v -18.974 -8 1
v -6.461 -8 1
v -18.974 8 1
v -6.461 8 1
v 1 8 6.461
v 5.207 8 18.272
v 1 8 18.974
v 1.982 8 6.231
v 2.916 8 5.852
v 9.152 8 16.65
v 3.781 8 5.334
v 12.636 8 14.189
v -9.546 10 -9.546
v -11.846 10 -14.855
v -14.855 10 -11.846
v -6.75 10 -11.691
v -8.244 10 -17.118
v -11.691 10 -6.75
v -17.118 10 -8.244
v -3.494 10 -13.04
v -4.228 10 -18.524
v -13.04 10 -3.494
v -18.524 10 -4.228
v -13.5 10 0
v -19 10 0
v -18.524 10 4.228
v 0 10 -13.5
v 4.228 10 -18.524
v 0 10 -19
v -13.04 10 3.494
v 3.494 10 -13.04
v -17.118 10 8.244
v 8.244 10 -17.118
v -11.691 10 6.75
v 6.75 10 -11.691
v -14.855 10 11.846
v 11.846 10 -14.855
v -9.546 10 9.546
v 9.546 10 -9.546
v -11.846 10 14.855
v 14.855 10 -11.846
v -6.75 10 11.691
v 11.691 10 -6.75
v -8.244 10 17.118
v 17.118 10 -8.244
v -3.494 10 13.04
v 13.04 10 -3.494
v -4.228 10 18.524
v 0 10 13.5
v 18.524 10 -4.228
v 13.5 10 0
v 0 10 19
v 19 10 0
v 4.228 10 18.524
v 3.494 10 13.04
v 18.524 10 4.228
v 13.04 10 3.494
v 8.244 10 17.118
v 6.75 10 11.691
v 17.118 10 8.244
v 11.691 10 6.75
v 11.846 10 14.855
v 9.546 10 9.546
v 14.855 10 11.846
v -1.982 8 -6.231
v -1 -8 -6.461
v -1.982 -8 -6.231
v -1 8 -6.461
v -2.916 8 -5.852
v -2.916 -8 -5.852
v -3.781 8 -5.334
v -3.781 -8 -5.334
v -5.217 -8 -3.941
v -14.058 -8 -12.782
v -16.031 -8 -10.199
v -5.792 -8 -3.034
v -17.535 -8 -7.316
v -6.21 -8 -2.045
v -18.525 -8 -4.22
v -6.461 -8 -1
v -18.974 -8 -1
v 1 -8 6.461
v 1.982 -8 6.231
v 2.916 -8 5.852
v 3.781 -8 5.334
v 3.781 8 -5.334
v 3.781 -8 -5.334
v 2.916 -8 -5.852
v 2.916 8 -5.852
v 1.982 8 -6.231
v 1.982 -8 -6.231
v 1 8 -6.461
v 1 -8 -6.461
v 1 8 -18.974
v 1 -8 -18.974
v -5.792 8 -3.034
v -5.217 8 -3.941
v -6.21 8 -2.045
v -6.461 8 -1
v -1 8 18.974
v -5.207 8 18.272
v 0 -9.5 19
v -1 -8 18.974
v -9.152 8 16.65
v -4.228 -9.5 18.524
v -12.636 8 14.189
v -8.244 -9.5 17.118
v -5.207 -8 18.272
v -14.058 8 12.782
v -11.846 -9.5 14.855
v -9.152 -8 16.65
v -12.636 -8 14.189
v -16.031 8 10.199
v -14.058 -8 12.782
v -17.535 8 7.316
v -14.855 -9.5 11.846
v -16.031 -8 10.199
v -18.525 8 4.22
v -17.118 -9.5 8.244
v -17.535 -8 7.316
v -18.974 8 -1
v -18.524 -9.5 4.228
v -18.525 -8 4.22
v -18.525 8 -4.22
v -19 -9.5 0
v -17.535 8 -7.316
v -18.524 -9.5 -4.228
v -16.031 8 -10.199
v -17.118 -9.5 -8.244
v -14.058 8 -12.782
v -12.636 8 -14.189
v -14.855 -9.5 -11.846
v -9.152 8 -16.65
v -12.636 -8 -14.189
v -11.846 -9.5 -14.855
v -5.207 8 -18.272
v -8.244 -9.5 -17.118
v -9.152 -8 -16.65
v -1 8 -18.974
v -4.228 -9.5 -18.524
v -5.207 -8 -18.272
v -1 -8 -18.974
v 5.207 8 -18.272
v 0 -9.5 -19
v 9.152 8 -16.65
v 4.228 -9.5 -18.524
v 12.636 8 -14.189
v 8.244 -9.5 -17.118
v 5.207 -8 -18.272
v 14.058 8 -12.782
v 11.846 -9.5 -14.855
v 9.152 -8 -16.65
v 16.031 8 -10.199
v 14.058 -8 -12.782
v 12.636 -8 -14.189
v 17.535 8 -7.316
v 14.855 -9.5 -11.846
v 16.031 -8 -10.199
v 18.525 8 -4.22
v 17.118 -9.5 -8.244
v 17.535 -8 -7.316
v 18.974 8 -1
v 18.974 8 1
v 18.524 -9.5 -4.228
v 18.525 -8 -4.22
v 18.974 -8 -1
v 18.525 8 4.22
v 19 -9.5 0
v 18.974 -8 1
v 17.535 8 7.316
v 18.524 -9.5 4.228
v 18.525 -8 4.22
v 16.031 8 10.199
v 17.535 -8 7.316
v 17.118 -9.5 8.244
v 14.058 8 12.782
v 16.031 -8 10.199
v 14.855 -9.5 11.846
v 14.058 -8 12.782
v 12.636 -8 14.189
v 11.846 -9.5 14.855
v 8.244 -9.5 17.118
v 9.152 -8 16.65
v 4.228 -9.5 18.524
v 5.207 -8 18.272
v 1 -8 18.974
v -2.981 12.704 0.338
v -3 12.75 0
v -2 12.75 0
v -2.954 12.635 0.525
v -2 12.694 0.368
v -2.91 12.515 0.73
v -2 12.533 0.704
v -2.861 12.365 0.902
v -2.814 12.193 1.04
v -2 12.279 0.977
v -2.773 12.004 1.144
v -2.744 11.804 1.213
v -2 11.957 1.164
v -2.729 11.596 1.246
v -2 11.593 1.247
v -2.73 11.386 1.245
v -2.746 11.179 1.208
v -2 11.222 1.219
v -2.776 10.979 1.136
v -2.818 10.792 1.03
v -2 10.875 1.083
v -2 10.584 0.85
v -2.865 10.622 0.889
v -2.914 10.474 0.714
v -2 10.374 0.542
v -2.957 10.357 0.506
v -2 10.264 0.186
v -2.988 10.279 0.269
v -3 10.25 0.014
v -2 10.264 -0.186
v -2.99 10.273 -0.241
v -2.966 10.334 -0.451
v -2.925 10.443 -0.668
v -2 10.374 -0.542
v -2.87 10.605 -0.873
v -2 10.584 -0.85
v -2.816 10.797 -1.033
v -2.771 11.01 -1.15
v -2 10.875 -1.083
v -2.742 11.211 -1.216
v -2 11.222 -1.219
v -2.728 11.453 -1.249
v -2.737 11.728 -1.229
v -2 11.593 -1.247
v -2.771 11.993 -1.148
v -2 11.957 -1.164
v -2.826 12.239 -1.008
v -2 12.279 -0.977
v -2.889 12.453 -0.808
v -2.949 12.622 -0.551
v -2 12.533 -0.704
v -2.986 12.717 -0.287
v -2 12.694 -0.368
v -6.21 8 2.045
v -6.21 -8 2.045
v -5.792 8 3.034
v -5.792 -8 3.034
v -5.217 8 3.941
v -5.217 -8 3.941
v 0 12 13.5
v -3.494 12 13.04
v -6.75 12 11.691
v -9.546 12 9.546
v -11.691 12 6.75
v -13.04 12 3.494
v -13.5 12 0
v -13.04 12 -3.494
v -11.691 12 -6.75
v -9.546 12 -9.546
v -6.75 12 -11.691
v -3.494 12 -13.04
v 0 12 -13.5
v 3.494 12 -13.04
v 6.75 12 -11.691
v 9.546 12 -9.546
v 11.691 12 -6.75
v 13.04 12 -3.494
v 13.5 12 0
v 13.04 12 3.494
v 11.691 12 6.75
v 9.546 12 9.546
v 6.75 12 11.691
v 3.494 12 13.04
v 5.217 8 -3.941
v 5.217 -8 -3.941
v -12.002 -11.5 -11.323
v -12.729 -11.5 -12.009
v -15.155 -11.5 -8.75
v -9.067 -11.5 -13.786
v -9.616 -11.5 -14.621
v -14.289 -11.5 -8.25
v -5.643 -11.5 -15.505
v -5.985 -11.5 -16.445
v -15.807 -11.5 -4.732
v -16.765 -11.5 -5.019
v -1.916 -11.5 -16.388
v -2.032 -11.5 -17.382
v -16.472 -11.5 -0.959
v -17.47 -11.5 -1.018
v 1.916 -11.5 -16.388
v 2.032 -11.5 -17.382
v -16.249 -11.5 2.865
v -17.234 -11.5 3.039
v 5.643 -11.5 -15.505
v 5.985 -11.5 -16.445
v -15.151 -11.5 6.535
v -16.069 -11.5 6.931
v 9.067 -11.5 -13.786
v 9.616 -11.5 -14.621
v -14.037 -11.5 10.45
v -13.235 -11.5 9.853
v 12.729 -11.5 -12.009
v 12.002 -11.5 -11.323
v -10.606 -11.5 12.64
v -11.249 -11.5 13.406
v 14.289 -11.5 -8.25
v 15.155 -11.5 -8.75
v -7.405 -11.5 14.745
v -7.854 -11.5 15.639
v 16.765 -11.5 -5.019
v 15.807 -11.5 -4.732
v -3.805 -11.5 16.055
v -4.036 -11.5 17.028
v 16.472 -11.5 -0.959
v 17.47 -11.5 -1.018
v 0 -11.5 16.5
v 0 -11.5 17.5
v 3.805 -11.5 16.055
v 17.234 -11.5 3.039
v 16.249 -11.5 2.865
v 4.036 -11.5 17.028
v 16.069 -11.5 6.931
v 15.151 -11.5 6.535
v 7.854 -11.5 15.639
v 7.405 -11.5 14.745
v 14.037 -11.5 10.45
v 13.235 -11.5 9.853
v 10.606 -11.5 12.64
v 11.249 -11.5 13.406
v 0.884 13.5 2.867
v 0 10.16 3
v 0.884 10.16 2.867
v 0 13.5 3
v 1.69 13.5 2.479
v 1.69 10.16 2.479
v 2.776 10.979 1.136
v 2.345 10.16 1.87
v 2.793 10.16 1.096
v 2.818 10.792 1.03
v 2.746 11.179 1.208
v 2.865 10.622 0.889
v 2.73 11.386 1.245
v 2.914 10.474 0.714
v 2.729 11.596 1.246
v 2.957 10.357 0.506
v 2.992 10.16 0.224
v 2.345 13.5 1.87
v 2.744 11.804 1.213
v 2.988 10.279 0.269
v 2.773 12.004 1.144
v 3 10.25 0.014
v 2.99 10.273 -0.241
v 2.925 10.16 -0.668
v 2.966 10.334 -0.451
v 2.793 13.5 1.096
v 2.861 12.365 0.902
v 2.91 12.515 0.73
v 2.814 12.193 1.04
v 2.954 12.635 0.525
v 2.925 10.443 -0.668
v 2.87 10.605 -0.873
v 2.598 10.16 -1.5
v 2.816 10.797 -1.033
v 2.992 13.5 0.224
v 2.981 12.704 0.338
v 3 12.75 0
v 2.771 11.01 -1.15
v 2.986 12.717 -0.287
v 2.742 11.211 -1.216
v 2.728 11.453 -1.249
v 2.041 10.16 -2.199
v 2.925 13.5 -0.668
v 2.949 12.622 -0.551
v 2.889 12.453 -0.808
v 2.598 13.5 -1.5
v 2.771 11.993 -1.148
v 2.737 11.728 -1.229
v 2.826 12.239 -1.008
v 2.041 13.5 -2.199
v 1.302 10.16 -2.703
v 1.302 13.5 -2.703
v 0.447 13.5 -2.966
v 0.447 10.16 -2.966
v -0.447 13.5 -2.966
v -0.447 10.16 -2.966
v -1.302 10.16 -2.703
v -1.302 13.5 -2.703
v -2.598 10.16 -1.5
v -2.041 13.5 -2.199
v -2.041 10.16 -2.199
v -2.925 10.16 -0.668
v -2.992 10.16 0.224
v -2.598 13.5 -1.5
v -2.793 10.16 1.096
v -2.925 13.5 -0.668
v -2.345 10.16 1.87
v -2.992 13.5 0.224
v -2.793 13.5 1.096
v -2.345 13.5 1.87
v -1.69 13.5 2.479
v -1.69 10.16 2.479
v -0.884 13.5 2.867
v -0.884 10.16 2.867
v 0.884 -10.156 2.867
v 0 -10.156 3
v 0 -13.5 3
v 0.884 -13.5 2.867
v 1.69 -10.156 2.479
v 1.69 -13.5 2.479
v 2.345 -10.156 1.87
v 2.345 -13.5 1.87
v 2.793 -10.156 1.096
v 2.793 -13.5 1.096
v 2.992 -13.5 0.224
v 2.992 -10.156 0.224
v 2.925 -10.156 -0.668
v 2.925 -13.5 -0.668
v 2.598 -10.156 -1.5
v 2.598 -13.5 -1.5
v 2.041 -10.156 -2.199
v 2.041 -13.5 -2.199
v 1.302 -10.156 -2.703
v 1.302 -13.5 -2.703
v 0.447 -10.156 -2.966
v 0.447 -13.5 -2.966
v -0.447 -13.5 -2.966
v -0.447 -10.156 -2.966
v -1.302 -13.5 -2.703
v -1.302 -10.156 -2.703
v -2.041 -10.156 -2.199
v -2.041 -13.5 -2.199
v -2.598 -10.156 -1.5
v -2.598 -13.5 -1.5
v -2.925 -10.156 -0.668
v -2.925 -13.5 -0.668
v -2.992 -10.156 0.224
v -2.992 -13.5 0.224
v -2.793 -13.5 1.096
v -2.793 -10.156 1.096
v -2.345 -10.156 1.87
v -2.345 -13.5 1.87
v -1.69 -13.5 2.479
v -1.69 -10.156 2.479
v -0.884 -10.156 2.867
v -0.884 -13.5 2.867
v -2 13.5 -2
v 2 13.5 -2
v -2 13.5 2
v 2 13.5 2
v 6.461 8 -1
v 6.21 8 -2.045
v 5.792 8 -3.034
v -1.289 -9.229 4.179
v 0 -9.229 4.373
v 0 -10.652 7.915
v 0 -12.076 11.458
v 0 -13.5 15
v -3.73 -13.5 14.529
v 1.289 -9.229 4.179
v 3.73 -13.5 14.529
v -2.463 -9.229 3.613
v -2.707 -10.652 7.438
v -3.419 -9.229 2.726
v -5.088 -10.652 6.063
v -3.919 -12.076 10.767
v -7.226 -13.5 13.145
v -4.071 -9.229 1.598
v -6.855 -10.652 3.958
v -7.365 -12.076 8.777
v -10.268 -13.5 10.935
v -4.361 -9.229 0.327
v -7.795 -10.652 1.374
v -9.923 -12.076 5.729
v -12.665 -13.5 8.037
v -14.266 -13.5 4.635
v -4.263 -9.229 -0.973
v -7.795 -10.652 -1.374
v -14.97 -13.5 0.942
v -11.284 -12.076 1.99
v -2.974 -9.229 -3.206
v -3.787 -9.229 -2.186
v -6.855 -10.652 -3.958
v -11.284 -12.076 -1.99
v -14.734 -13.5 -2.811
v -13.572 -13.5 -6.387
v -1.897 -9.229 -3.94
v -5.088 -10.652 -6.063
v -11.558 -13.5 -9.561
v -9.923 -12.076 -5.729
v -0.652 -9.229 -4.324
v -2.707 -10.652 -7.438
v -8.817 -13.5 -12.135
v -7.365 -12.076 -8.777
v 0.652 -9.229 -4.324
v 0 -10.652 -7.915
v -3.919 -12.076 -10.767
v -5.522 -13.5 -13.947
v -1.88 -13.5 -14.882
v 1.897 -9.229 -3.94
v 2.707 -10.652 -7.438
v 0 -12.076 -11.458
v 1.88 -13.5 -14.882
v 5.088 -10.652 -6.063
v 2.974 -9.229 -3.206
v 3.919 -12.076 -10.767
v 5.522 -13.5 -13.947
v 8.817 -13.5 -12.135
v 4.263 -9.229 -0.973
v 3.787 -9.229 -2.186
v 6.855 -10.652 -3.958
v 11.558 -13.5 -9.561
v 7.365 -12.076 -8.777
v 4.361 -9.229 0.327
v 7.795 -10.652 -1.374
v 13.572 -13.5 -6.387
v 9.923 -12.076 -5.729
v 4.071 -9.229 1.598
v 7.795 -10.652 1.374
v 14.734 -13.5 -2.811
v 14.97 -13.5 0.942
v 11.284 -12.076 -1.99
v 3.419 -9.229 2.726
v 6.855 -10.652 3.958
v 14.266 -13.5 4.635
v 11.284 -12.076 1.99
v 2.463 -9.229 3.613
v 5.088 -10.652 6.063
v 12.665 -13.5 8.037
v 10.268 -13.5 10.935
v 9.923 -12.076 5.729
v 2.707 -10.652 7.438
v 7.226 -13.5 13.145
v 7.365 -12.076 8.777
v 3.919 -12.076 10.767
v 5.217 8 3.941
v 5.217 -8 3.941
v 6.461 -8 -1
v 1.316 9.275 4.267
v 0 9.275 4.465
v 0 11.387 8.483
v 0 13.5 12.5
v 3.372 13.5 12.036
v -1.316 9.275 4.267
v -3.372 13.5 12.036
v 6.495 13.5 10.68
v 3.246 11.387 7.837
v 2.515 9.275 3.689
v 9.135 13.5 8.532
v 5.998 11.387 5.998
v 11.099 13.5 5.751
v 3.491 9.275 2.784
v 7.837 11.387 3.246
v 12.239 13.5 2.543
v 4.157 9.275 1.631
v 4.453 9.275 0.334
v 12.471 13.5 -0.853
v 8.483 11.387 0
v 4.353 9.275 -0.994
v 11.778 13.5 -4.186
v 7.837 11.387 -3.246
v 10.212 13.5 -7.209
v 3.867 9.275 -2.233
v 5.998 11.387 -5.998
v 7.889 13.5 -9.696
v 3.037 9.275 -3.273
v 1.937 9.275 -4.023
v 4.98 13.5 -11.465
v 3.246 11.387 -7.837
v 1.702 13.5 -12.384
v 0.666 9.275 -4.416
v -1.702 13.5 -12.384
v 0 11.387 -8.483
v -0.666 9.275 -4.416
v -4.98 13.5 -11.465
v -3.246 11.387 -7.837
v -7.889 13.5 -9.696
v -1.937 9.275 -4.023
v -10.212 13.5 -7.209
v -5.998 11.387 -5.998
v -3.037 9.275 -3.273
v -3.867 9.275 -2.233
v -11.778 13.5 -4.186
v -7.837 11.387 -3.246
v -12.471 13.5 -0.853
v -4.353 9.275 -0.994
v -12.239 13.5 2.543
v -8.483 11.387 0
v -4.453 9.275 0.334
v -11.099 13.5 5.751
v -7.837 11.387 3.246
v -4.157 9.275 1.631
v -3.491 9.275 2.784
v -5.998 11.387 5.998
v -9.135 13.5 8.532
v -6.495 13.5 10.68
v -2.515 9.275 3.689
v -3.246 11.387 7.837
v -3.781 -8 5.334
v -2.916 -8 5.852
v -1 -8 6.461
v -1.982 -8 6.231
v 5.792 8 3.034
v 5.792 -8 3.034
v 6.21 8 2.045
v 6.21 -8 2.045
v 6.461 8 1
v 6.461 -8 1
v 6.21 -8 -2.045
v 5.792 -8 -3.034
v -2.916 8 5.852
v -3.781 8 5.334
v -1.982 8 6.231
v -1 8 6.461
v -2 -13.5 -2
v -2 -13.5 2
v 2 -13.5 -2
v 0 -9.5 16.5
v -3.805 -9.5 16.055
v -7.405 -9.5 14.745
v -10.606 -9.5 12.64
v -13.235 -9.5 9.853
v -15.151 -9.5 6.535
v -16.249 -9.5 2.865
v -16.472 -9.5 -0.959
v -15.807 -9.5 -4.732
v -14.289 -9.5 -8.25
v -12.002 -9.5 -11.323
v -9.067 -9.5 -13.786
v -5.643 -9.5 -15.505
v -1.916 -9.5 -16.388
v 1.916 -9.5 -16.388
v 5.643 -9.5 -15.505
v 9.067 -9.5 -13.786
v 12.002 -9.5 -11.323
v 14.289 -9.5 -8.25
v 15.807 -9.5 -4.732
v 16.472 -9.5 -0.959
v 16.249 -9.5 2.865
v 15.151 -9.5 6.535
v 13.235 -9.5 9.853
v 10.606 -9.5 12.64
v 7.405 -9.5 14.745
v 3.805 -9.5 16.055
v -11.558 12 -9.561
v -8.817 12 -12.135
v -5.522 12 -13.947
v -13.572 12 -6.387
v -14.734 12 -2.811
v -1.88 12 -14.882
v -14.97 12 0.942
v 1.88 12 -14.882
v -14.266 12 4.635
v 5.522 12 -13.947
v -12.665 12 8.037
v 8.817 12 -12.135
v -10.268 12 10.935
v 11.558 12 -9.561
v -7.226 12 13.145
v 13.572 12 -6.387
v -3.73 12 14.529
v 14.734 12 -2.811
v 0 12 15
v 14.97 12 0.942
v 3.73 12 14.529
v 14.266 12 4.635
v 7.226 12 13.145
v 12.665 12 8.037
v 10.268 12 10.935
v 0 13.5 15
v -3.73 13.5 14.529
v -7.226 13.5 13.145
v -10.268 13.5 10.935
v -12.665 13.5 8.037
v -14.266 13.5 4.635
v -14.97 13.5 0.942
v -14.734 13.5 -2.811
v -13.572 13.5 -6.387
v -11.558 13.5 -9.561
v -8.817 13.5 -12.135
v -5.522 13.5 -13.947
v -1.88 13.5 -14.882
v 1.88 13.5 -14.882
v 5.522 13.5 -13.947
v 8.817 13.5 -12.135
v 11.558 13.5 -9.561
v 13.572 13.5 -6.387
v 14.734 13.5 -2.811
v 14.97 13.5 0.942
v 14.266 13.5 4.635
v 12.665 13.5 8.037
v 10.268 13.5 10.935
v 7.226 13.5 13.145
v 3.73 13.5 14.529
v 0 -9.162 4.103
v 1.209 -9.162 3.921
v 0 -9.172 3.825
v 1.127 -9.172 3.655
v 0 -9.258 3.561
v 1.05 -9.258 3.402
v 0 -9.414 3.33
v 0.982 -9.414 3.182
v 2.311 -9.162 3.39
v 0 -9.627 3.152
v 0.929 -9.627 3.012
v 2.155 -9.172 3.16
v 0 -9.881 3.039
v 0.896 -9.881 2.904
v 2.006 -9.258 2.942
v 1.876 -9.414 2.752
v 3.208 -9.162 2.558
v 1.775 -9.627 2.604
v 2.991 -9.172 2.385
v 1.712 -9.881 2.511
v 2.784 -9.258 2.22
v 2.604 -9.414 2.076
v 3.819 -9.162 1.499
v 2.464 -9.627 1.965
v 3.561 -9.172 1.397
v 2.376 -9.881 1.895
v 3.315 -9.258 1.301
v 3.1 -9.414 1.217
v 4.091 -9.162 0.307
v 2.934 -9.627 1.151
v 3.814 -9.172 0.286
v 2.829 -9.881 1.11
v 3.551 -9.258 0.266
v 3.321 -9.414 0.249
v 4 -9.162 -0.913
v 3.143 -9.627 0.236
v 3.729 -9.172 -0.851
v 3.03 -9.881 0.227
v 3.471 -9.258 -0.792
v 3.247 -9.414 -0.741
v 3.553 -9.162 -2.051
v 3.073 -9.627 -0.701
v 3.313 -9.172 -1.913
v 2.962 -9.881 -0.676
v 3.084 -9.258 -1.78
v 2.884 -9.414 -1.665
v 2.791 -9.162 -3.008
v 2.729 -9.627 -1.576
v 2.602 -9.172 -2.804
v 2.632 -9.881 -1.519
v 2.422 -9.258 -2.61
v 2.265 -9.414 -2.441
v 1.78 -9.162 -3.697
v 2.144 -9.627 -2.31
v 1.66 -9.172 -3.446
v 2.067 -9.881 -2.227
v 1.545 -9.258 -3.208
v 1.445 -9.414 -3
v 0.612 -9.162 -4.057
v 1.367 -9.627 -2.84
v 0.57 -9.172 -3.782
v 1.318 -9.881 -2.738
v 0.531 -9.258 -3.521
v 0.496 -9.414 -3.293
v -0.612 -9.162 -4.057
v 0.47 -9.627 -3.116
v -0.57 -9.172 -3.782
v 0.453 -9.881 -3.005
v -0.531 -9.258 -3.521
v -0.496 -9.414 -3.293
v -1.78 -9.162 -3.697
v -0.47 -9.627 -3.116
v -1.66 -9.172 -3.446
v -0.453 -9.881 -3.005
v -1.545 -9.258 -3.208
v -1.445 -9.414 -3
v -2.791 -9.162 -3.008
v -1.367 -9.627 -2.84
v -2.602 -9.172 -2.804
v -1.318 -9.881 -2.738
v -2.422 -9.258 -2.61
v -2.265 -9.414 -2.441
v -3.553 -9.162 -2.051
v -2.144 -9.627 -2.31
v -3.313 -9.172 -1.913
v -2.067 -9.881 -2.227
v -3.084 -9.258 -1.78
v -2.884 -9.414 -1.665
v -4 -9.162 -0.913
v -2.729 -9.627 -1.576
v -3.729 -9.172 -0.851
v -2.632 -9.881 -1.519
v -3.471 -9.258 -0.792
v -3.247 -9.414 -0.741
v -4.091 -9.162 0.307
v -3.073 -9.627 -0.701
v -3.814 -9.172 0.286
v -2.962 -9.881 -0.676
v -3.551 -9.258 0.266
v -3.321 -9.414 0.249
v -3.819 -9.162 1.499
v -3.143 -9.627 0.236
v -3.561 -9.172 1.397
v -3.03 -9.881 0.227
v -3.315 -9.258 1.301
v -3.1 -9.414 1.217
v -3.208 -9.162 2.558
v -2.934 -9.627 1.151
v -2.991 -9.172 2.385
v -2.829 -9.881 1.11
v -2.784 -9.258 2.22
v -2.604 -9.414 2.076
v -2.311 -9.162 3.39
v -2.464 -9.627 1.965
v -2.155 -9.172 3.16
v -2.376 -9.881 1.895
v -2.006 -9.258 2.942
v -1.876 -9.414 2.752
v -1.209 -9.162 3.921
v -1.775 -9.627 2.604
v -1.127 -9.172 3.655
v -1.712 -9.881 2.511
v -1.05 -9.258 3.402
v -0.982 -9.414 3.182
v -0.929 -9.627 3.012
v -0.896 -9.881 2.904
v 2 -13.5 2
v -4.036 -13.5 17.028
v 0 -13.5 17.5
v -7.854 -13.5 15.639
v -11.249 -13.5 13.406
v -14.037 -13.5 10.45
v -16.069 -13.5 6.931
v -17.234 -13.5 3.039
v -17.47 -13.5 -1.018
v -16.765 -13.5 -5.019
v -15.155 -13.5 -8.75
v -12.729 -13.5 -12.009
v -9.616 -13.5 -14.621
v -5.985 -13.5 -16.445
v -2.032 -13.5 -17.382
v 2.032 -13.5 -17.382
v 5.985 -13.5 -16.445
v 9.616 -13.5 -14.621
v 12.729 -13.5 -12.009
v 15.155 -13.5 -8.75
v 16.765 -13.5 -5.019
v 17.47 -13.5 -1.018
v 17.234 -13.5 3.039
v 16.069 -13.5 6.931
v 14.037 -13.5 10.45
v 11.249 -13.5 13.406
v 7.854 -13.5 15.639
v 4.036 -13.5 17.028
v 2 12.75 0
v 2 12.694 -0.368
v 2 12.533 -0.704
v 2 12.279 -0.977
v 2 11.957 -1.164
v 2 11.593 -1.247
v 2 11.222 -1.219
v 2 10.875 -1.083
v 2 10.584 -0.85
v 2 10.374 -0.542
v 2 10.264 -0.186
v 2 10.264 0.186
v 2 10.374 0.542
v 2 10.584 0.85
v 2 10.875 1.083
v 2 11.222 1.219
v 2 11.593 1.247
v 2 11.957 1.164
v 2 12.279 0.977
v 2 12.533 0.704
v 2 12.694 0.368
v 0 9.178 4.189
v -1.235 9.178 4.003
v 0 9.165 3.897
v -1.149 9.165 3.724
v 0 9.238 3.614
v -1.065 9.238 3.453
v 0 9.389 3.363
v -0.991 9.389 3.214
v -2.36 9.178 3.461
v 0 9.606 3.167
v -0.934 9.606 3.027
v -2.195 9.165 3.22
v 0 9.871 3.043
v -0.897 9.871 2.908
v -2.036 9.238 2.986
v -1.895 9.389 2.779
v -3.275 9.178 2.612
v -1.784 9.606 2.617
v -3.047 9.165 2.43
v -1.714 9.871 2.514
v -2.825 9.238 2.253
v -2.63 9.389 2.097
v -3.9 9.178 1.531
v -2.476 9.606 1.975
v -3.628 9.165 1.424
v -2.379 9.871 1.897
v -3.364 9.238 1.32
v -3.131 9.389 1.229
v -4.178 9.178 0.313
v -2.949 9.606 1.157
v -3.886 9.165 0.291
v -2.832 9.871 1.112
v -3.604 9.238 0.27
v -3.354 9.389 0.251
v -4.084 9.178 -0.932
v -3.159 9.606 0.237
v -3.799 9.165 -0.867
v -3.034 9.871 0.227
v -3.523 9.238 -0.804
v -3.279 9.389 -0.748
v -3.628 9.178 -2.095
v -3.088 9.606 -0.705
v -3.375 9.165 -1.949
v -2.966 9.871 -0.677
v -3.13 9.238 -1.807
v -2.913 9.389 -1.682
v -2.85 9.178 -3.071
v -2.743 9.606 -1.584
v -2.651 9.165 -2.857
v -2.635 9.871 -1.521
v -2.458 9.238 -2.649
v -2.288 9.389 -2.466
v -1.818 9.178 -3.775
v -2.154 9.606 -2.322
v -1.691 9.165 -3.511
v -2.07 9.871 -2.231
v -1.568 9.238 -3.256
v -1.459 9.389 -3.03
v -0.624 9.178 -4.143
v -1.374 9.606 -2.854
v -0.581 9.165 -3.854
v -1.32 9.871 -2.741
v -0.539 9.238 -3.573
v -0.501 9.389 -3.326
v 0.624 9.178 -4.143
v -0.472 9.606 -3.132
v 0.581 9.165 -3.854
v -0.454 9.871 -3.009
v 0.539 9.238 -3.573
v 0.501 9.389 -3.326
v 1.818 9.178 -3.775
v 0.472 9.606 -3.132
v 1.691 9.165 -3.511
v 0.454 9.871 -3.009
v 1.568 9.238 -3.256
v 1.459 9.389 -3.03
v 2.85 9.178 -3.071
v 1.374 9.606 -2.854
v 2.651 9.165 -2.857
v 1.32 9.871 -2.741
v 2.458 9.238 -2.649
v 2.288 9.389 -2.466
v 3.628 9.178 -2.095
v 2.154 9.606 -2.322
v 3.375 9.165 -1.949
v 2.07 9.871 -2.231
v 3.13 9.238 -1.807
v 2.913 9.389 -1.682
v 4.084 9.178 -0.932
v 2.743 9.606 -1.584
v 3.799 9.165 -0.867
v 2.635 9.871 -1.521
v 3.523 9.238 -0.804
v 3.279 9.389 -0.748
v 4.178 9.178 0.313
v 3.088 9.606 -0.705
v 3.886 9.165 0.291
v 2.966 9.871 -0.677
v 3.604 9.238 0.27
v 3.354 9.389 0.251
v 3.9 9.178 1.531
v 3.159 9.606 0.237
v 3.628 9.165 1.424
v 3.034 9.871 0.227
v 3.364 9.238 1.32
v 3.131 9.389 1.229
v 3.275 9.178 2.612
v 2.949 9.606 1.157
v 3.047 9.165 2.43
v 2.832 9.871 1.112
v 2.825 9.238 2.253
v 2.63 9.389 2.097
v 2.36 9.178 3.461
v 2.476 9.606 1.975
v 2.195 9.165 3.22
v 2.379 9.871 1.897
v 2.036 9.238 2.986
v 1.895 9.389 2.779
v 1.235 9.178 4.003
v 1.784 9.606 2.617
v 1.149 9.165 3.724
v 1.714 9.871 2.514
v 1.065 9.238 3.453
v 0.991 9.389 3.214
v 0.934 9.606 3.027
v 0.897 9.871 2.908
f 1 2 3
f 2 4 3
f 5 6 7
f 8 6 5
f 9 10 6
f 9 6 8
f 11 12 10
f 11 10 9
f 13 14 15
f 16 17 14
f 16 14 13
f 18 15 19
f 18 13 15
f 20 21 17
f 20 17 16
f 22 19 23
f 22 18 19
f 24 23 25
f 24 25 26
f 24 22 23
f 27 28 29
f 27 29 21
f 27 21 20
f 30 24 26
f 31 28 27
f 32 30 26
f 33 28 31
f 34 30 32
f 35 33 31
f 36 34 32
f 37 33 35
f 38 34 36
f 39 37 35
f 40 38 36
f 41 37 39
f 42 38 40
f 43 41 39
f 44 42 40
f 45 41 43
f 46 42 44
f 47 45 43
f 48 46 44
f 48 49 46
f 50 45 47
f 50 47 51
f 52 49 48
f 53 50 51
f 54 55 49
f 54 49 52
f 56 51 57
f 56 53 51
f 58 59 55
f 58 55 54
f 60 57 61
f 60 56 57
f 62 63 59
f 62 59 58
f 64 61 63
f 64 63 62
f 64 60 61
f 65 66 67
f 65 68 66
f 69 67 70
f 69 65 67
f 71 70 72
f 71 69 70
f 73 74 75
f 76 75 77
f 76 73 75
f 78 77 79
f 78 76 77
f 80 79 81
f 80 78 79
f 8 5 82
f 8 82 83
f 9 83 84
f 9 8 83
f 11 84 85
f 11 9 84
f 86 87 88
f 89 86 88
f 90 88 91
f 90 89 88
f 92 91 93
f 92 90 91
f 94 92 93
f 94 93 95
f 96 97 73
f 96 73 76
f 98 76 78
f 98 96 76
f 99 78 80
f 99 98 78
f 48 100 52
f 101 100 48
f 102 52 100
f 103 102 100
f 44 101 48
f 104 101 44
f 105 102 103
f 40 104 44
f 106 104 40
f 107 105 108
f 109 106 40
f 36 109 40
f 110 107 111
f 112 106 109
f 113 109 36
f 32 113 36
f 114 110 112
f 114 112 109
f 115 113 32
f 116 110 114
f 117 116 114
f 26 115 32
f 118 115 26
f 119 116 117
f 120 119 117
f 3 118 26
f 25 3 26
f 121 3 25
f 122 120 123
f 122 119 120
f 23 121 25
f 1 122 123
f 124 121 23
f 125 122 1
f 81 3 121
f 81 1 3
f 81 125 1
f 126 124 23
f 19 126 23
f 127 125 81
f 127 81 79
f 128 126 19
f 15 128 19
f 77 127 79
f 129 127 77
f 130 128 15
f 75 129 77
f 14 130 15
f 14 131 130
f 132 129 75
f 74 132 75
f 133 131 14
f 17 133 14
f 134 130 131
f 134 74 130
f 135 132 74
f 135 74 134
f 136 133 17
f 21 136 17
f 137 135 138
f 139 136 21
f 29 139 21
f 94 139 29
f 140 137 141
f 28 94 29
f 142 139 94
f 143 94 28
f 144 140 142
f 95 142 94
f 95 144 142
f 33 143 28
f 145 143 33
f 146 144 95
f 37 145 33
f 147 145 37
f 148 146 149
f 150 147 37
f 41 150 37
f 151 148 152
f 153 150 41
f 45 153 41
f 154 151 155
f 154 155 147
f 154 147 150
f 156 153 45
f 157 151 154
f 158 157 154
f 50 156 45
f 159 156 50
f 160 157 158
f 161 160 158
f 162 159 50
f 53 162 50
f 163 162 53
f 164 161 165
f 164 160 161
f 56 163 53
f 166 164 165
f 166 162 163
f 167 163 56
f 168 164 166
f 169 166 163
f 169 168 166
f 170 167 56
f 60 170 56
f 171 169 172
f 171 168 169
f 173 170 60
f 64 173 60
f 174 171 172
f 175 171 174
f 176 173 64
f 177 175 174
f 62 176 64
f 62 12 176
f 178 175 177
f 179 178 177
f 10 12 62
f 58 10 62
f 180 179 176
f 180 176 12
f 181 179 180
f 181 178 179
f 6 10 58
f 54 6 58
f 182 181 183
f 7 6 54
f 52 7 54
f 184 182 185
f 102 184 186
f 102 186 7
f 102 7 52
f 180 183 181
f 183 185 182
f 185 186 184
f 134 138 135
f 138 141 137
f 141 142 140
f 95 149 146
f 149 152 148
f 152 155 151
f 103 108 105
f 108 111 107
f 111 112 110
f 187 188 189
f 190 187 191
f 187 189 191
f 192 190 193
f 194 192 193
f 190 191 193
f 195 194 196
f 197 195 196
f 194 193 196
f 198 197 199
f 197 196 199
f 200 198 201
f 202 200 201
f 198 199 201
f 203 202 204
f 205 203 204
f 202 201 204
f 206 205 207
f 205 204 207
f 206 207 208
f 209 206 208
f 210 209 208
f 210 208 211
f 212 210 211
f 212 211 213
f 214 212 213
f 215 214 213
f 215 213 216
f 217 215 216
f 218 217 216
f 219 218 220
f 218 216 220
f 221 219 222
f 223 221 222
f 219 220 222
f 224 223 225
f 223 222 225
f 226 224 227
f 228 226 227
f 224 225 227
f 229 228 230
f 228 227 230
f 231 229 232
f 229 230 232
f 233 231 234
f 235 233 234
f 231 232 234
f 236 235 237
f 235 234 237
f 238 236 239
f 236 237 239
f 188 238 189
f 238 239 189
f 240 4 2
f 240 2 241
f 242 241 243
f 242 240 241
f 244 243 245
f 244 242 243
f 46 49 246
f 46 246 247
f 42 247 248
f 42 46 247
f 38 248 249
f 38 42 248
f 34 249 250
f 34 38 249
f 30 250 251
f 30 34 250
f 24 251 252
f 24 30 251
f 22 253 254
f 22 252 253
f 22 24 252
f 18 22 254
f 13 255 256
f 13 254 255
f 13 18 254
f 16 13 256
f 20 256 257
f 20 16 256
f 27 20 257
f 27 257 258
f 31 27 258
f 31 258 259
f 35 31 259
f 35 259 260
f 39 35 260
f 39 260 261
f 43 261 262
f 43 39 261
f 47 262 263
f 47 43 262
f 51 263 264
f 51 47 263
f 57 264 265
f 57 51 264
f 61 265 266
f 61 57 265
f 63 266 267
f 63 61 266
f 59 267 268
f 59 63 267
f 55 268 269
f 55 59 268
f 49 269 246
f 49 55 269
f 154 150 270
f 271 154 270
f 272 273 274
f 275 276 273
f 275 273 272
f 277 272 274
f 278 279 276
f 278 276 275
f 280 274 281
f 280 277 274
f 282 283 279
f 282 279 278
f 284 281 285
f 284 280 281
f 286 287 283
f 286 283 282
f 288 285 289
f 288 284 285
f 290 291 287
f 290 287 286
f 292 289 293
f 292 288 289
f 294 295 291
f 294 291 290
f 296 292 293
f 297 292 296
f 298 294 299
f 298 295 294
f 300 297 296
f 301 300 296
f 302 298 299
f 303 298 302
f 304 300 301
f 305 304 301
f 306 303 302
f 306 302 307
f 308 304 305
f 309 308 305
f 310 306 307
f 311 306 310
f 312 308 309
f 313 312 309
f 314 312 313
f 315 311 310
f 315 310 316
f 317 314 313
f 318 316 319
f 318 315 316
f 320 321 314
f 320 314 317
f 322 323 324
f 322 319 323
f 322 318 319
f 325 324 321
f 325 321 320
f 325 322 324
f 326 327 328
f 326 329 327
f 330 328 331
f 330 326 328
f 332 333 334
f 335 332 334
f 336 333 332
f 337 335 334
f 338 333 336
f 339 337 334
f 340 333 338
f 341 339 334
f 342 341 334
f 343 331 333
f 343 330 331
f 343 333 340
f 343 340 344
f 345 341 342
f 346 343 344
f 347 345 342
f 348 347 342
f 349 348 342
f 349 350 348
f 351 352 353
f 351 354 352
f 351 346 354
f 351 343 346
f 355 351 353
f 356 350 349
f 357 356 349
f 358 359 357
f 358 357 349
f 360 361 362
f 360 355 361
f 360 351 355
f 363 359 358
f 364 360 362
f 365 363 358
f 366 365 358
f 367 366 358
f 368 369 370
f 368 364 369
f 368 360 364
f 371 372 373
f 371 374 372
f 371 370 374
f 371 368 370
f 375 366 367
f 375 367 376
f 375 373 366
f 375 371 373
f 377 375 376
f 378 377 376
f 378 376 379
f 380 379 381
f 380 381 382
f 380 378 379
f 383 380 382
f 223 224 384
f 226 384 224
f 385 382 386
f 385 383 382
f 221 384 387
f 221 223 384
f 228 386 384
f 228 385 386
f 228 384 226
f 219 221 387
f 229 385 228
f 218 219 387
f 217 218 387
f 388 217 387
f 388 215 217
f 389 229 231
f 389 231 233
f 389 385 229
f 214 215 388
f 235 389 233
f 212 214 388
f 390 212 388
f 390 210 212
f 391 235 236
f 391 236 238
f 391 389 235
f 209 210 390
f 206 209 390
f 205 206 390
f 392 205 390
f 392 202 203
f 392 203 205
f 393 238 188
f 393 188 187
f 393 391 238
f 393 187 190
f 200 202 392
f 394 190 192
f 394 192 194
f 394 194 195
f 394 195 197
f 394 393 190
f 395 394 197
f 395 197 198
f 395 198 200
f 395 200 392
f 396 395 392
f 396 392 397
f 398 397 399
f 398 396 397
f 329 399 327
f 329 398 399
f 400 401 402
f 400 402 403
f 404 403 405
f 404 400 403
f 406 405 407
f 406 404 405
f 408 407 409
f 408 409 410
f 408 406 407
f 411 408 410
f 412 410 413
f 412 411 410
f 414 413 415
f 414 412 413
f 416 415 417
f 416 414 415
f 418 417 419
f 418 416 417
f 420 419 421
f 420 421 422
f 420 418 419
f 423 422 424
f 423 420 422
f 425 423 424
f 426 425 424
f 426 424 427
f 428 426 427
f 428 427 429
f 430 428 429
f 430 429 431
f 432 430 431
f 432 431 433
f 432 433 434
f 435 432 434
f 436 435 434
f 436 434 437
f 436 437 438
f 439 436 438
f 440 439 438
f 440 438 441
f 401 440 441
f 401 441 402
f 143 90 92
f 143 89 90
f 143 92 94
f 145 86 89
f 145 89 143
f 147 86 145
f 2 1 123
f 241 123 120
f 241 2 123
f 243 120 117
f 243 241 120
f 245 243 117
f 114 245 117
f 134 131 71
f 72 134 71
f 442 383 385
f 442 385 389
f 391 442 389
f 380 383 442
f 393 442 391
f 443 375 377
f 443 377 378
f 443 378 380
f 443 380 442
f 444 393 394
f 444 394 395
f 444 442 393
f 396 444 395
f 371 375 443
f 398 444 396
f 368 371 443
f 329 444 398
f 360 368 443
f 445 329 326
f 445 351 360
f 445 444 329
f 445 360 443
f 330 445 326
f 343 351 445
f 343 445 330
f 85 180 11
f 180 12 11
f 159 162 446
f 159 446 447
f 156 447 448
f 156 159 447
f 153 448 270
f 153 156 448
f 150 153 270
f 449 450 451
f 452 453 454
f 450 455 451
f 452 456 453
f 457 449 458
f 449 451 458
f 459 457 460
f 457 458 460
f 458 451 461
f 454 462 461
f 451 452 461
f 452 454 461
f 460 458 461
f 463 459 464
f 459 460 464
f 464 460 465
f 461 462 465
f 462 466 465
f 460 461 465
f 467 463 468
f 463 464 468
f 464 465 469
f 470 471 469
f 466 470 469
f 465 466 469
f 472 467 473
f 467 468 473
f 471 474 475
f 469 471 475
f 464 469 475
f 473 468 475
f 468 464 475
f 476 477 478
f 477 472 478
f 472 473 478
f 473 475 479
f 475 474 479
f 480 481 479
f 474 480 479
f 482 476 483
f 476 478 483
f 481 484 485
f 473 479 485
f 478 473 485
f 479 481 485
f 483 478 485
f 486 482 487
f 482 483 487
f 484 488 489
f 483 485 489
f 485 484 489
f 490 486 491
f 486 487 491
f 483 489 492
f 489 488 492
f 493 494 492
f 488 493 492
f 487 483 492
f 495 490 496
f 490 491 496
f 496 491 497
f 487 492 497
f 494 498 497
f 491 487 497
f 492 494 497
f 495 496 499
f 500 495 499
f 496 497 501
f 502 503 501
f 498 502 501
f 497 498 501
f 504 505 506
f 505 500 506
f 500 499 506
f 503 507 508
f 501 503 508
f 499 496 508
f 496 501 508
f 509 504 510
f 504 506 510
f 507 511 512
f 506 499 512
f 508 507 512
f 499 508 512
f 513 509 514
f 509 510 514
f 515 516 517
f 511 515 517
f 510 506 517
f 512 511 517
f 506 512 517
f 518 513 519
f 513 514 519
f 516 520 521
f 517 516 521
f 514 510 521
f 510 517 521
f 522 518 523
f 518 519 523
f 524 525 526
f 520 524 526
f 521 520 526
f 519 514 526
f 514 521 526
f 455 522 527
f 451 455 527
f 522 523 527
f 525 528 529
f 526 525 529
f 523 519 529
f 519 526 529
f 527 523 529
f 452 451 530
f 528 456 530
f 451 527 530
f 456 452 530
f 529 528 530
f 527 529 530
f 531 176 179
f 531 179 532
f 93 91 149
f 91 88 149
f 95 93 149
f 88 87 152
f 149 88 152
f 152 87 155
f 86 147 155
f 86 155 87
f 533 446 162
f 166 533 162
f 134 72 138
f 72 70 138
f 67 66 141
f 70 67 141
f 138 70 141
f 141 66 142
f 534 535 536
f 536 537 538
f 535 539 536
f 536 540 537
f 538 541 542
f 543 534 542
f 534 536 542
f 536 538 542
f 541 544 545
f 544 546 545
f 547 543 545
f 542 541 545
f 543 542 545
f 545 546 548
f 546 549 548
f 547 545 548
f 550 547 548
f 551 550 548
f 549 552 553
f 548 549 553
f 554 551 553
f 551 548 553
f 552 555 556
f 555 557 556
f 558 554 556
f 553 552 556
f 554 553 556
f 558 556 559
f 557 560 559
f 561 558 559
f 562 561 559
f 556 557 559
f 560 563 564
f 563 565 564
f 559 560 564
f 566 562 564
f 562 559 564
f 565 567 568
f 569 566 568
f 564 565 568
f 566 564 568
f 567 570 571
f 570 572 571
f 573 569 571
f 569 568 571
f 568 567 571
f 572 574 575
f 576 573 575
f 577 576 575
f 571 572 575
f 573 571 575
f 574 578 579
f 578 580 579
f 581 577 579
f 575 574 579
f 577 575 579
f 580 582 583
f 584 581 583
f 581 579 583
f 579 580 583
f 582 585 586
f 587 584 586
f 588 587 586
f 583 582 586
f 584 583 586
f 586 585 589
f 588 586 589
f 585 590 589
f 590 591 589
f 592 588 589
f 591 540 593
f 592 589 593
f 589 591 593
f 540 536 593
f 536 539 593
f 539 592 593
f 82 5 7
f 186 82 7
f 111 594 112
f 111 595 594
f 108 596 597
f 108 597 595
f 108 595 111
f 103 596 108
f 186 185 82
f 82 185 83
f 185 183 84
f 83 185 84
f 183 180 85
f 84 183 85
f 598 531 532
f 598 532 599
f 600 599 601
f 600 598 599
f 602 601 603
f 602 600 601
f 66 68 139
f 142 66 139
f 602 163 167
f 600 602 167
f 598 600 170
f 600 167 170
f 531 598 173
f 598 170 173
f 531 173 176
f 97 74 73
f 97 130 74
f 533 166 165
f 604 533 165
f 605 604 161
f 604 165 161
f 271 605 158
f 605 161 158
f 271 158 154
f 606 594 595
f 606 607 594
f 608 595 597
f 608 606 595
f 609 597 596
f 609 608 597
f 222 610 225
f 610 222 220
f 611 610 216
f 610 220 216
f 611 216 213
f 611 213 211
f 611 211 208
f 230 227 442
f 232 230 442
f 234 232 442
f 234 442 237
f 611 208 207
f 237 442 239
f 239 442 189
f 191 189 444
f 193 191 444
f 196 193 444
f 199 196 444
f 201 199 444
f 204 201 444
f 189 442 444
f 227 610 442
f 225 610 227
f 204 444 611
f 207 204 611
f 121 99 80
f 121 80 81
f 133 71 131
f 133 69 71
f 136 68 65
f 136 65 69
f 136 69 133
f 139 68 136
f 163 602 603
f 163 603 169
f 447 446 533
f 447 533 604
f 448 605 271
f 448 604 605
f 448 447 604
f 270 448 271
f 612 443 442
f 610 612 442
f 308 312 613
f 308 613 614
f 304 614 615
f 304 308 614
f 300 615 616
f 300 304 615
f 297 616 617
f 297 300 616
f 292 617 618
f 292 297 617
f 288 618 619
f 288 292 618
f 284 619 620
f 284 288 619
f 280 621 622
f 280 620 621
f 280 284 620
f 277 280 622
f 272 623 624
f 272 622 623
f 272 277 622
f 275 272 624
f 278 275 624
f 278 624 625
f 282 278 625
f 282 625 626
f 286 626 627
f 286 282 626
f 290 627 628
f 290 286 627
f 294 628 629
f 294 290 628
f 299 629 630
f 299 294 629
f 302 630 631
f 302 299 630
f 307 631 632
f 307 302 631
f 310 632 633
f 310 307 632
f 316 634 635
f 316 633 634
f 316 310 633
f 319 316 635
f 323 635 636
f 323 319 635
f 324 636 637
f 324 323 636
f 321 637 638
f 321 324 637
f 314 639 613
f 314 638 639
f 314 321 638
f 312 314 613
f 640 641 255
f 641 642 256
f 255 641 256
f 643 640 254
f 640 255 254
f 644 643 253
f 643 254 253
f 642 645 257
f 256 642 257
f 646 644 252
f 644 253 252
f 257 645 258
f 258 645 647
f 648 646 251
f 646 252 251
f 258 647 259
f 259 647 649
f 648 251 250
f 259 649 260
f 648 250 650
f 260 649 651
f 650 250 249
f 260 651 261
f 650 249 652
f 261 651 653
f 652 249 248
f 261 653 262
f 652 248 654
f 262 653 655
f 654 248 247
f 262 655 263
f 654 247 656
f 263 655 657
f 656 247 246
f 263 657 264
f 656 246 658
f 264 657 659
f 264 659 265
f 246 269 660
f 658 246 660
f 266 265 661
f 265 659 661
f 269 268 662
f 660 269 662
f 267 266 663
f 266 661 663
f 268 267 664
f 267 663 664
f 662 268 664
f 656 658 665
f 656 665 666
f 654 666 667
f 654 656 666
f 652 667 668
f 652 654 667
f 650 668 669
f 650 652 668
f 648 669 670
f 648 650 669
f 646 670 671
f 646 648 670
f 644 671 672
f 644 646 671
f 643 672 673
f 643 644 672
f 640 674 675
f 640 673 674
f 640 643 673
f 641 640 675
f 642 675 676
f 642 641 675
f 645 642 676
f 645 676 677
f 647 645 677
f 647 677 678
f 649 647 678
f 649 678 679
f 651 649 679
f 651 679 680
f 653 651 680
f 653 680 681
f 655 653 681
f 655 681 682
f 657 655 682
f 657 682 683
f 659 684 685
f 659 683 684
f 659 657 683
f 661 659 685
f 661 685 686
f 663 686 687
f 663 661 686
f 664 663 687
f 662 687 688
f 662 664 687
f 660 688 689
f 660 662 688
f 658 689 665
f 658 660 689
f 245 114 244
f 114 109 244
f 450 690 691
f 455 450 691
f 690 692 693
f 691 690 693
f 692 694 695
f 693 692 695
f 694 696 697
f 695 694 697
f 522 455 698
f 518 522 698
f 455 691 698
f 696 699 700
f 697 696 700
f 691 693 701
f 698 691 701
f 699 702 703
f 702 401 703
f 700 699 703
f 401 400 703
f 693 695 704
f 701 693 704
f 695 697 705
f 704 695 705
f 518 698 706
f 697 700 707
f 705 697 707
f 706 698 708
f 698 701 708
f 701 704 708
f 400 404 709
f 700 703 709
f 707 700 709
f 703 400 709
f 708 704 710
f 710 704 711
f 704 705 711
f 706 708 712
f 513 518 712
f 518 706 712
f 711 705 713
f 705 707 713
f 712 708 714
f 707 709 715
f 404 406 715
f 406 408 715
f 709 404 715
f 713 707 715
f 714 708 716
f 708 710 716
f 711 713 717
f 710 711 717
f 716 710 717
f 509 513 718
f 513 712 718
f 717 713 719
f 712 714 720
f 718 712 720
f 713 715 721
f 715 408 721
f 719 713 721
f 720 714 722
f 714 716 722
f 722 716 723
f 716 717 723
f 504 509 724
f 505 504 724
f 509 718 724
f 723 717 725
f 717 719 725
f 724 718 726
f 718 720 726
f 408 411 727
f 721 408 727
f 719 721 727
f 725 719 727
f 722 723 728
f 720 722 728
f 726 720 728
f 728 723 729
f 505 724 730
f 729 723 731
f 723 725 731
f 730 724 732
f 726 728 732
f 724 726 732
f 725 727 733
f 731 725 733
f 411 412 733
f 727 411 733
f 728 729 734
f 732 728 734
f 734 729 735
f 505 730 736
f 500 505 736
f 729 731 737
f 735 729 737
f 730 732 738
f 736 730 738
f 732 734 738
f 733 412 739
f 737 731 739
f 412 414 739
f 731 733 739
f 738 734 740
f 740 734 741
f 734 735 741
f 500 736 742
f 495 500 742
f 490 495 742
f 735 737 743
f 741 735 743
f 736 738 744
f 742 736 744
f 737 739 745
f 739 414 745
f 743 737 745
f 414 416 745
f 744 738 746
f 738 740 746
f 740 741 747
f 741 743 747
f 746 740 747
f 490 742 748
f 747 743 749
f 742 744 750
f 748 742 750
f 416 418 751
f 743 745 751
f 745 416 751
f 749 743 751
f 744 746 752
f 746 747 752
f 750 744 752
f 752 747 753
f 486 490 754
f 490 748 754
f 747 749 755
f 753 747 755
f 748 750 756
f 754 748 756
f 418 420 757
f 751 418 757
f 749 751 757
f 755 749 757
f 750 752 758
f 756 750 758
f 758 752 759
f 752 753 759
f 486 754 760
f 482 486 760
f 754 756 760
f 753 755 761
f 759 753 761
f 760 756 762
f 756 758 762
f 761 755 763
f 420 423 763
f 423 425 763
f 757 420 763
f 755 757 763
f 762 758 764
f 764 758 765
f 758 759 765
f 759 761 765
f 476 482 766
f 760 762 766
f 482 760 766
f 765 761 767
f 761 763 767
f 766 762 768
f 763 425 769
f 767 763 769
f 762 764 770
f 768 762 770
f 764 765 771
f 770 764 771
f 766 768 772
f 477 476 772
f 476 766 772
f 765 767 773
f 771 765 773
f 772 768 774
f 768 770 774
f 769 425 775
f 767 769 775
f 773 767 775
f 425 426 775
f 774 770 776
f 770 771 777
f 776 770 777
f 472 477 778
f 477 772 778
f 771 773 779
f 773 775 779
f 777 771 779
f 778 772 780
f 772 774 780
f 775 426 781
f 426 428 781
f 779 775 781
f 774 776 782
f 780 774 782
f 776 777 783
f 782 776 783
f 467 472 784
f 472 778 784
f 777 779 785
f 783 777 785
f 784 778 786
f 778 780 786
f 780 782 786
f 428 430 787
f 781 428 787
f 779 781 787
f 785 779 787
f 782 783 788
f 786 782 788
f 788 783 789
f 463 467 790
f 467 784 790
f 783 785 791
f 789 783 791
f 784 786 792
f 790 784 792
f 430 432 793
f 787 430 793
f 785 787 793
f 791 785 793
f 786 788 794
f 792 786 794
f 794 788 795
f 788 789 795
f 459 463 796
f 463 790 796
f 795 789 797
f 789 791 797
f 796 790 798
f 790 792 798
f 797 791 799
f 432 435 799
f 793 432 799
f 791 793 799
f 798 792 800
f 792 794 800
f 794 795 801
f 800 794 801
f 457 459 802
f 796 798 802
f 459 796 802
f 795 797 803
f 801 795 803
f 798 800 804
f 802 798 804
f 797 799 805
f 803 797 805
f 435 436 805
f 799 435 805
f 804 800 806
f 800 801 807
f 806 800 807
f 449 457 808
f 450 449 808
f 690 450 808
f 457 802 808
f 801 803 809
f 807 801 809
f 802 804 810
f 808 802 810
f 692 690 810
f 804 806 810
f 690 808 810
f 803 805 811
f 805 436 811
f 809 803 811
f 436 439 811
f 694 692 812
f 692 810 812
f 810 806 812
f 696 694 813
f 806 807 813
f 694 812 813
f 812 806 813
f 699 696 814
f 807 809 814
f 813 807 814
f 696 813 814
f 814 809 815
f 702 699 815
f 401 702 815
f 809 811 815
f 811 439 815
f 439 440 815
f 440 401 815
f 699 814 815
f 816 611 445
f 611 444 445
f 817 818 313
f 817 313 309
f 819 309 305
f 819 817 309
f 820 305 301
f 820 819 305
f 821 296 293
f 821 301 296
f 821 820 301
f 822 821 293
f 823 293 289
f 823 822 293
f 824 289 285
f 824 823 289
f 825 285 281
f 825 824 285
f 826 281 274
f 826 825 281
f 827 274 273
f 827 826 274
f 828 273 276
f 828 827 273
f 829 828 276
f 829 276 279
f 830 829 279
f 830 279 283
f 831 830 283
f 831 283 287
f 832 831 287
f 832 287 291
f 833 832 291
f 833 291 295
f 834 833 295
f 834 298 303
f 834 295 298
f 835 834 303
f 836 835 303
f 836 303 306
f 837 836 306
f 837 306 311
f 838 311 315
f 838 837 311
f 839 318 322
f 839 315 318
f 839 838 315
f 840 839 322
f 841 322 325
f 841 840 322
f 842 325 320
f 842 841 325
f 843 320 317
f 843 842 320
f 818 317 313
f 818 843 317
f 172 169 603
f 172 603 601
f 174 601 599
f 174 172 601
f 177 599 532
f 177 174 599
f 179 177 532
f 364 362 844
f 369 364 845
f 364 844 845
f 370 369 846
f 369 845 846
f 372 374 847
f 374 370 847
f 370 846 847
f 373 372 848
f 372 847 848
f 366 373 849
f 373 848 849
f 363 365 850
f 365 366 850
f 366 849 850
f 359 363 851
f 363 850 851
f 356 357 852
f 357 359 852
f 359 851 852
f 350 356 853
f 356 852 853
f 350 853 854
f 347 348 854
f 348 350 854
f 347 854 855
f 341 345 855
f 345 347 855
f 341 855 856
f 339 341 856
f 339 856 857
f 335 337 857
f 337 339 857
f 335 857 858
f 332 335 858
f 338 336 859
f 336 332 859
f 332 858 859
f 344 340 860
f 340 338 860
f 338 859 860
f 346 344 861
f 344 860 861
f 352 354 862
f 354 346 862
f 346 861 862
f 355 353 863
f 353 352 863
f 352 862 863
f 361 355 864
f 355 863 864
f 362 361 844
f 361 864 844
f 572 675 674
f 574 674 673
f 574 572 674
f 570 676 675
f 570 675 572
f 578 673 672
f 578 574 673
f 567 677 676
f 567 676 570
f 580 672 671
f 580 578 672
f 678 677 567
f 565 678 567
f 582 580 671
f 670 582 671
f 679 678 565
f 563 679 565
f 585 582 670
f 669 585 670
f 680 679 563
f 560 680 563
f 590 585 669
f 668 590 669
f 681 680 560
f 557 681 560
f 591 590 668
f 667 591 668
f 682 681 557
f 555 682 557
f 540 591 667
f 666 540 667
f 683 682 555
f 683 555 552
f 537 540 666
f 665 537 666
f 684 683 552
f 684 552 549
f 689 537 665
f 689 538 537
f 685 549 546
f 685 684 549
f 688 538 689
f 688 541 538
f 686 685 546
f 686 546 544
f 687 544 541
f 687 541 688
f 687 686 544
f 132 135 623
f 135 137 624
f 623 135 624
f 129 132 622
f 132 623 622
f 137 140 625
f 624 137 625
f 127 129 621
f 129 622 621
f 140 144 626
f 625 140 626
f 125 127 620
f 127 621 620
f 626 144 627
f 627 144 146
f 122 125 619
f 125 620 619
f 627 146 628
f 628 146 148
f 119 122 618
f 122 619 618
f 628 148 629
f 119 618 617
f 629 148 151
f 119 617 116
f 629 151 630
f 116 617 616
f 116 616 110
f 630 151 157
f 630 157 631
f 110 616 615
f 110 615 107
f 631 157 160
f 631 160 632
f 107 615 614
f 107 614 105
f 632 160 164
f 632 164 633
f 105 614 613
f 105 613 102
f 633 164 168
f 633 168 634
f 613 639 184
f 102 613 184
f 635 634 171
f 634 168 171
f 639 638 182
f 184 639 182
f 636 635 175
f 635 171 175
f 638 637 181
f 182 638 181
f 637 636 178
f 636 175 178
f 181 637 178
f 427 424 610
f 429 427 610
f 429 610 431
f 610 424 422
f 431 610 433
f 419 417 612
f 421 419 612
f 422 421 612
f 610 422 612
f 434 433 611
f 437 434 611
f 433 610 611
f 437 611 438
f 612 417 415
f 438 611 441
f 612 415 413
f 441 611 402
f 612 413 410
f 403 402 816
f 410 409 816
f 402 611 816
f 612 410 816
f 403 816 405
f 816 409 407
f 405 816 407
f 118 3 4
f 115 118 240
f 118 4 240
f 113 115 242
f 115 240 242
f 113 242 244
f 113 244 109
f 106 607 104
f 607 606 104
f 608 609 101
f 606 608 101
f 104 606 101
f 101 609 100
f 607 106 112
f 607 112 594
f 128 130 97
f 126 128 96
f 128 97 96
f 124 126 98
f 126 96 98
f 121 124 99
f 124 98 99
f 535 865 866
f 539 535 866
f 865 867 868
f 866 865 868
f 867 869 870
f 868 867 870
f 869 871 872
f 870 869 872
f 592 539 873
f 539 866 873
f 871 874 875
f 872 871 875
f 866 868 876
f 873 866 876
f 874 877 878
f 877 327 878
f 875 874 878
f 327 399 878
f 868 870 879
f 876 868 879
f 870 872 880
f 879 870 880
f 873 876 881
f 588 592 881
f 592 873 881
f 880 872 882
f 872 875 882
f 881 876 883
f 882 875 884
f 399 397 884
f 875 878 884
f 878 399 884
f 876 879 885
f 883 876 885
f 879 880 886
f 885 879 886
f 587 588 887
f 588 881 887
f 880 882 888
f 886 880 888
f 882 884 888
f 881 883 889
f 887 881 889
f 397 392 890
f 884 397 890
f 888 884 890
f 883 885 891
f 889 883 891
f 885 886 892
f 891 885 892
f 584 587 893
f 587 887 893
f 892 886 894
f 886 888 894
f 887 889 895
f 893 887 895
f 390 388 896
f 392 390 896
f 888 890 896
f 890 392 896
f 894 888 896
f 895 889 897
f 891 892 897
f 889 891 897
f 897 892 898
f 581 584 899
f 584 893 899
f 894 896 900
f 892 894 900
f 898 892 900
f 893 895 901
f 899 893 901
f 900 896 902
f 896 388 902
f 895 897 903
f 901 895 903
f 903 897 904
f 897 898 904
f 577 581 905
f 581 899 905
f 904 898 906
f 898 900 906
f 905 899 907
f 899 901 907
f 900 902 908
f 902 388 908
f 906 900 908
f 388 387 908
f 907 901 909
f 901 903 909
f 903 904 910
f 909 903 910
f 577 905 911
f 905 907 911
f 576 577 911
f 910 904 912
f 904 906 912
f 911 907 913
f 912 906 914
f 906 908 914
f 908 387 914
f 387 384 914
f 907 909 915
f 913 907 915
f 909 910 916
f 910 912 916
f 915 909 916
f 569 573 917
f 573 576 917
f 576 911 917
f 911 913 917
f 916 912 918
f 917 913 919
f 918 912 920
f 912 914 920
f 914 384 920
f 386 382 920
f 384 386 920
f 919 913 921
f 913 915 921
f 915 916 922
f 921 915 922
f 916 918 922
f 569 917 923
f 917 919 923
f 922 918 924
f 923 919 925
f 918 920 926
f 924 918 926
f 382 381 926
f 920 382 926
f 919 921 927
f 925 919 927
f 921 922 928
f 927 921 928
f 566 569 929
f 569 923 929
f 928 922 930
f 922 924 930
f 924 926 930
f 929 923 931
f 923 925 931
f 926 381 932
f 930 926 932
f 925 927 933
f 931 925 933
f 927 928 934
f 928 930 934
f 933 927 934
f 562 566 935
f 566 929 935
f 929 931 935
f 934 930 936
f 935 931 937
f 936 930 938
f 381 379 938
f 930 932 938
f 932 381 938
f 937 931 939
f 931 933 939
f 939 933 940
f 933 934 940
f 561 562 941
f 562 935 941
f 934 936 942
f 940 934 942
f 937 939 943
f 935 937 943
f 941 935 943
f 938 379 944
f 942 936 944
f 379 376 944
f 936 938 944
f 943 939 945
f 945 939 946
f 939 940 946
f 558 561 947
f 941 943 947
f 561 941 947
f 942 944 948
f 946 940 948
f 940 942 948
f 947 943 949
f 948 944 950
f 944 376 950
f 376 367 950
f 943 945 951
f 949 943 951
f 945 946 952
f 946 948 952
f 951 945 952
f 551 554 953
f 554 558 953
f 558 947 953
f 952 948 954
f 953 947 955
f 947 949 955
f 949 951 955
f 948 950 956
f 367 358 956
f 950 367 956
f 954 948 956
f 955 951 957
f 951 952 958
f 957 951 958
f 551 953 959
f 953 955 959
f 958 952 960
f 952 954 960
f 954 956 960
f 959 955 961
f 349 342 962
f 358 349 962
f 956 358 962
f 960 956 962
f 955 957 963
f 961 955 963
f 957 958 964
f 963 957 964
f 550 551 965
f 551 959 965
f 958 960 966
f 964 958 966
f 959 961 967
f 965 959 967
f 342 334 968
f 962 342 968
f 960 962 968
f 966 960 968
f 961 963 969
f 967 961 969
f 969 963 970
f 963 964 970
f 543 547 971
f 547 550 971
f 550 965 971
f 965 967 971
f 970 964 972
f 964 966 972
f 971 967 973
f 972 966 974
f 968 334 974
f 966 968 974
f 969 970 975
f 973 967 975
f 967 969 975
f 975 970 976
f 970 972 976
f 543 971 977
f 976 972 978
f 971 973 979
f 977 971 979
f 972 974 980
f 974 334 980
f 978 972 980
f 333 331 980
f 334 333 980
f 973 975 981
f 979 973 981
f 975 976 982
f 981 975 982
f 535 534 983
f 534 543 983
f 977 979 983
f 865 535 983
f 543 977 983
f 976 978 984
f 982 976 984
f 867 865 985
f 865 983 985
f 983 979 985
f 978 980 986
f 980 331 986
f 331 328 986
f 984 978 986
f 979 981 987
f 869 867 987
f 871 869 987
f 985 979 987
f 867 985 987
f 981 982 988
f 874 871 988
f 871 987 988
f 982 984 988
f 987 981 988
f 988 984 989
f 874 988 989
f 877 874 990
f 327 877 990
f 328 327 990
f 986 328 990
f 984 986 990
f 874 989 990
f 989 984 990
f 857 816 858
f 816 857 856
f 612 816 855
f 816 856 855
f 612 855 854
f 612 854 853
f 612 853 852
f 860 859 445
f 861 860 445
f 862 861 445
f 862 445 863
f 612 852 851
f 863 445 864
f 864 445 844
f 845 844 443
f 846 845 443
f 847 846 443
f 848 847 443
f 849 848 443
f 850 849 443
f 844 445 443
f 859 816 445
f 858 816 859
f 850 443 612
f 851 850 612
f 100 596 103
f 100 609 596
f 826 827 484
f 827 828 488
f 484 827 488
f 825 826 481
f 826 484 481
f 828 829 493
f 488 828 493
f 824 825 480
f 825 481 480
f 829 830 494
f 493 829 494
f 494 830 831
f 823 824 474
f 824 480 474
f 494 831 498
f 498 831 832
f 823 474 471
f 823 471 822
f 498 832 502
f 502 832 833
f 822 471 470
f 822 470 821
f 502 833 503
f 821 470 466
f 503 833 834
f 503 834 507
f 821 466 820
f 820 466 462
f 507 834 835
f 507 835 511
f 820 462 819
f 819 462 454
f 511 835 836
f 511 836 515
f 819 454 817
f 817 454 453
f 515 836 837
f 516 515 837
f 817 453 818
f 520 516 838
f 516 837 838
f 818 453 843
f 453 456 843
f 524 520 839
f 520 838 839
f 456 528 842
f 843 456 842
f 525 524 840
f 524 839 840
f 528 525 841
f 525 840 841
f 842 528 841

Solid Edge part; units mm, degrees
sketch "Sketch1" plane through (0, 0, 0) normal (1, 0, 0) x (0, 1, 0)
  line L0 (-13.5, 17.5) -> (-13.5, 15)
  line L1 (-9.2285, 4.3729) -> (-13.5, 15)
  arc A0 (-9.2285, 4.3729) -> (-10.1564, 3) centre (-10.1564, 4) cw
  line L2 (-13.5, 3) -> (-10.1564, 3)
  line L3 (-13.5, 3) -> (-13.5, 0)
  line L4 (-13.5, 0) -> (13.5, 0)
  line L5 (13.5, 0) -> (13.5, 3)
  line L6 (10.16, 3) -> (13.5, 3)
  arc A1 (9.2749, 4.4654) -> (10.16, 3) centre (10.16, 4) ccw
  line L7 (13.5, 12.5) -> (9.2749, 4.4654)
  line L8 (13.5, 12.5) -> (13.5, 15)
  line L9 (13.5, 15) -> (12, 15)
  line L10 (12, 15) -> (12, 13.5)
  line L11 (12, 13.5) -> (10, 13.5)
  line L12 (10, 13.5) -> (10, 19)
  line L13 (10, 19) -> (-9.5, 19)
  line L14 (-9.5, 19) -> (-9.5, 16.5)
  line L15 (-9.5, 16.5) -> (-11.5, 16.5)
  line L16 (-11.5, 16.5) -> (-11.5, 17.5)
  line L17 (-11.5, 17.5) -> (-13.5, 17.5)
revolve "RevolvedProtrusion1" add sketch "Sketch1" angle 360 about axis through (0, -13.5, 0) along (0, 1, 0)
sketch "Sketch2" plane through (0, 0, 0) normal (0, -1, 0) x (1, 0, 0)
  line L0 (-16.5389, 18.0919) -> (-1, 20.5018)
  line L1 (-1, 6.4613) -> (-1, 20.5018)
  arc A0 (-1, 6.4613) -> (-3.7811, 5.3341) centre (0, 0) ccw
  line L2 (-16.5389, 18.0919) -> (-3.7811, 5.3341)
  line L3 (16.5389, 18.0919) -> (1, 20.5018)
  line L4 (1, 6.4613) -> (1, 20.5018)
  arc A1 (1, 6.4613) -> (3.7811, 5.3341) centre (0, 0) cw
  line L5 (16.5389, 18.0919) -> (3.7811, 5.3341)
  line L6 (-17.9531, 16.6777) -> (-5.2168, 3.9413)
  arc A2 (-5.2168, 3.9413) -> (-6.4613, 1) centre (0, 0) ccw
  line L7 (-6.4613, 1) -> (-22.8351, 1)
  line L8 (-17.9531, 16.6777) -> (-22.8351, 1)
  line L9 (17.9531, 16.6777) -> (22.8351, 1)
  line L10 (6.4613, 1) -> (22.8351, 1)
  line L11 (17.9531, 16.6777) -> (5.2168, 3.9413)
  arc A3 (5.2168, 3.9413) -> (6.4614, 1) centre (0, 0) cw
  line L12 (-17.9531, -16.6777) -> (-22.8351, -1)
  line L13 (-6.4613, -1) -> (-22.8351, -1)
  arc A4 (-5.2168, -3.9413) -> (-6.4613, -1) centre (0, 0) cw
  line L14 (-17.9531, -16.6777) -> (-5.2168, -3.9413)
  line L15 (-16.5389, -18.0919) -> (-1, -20.5018)
  line L16 (-1, -6.4613) -> (-1, -20.5018)
  arc A5 (-1, -6.4613) -> (-3.7811, -5.3341) centre (0, 0) cw
  line L17 (-16.5389, -18.0919) -> (-3.7811, -5.3341)
  line L18 (16.5389, -18.0919) -> (3.7811, -5.3341)
  arc A6 (1, -6.4613) -> (3.7811, -5.3341) centre (0, 0) ccw
  line L19 (1, -6.4613) -> (1, -20.5018)
  line L20 (16.5389, -18.0919) -> (1, -20.5018)
  line L21 (17.9531, -16.6777) -> (22.8351, -1)
  line L22 (6.4613, -1) -> (22.8351, -1)
  arc A7 (5.2168, -3.9413) -> (6.4613, -1) centre (0, 0) ccw
  line L23 (17.9531, -16.6777) -> (5.2168, -3.9413)
extrude "VaciadoExtruido_1" cut sketch "Sketch2" along normal blind 8 and the other way blind 8
sketch "Sketch3" plane through (0, 0, 0) normal (0, -1, 0) x (1, 0, 0)
  line L0 (2, -2) -> (-2, -2)
  line L1 (-2, -2) -> (-2, 2)
  line L2 (-2, 2) -> (2, 2)
  line L3 (2, 2) -> (2, -2)
extrude "Cutout1" cut sketch "Sketch3" along normal up to surface (27 mm away) from surface at -13.5
sketch "Sketch4" plane through (-2, 0, 0) normal (1, 0, 0) x (0, 1, 0)
  circle A0 centre (11.5, 0) radius 1.25
extrude "Cutout2" cut sketch "Sketch4" along normal up to next and the other way up to next
